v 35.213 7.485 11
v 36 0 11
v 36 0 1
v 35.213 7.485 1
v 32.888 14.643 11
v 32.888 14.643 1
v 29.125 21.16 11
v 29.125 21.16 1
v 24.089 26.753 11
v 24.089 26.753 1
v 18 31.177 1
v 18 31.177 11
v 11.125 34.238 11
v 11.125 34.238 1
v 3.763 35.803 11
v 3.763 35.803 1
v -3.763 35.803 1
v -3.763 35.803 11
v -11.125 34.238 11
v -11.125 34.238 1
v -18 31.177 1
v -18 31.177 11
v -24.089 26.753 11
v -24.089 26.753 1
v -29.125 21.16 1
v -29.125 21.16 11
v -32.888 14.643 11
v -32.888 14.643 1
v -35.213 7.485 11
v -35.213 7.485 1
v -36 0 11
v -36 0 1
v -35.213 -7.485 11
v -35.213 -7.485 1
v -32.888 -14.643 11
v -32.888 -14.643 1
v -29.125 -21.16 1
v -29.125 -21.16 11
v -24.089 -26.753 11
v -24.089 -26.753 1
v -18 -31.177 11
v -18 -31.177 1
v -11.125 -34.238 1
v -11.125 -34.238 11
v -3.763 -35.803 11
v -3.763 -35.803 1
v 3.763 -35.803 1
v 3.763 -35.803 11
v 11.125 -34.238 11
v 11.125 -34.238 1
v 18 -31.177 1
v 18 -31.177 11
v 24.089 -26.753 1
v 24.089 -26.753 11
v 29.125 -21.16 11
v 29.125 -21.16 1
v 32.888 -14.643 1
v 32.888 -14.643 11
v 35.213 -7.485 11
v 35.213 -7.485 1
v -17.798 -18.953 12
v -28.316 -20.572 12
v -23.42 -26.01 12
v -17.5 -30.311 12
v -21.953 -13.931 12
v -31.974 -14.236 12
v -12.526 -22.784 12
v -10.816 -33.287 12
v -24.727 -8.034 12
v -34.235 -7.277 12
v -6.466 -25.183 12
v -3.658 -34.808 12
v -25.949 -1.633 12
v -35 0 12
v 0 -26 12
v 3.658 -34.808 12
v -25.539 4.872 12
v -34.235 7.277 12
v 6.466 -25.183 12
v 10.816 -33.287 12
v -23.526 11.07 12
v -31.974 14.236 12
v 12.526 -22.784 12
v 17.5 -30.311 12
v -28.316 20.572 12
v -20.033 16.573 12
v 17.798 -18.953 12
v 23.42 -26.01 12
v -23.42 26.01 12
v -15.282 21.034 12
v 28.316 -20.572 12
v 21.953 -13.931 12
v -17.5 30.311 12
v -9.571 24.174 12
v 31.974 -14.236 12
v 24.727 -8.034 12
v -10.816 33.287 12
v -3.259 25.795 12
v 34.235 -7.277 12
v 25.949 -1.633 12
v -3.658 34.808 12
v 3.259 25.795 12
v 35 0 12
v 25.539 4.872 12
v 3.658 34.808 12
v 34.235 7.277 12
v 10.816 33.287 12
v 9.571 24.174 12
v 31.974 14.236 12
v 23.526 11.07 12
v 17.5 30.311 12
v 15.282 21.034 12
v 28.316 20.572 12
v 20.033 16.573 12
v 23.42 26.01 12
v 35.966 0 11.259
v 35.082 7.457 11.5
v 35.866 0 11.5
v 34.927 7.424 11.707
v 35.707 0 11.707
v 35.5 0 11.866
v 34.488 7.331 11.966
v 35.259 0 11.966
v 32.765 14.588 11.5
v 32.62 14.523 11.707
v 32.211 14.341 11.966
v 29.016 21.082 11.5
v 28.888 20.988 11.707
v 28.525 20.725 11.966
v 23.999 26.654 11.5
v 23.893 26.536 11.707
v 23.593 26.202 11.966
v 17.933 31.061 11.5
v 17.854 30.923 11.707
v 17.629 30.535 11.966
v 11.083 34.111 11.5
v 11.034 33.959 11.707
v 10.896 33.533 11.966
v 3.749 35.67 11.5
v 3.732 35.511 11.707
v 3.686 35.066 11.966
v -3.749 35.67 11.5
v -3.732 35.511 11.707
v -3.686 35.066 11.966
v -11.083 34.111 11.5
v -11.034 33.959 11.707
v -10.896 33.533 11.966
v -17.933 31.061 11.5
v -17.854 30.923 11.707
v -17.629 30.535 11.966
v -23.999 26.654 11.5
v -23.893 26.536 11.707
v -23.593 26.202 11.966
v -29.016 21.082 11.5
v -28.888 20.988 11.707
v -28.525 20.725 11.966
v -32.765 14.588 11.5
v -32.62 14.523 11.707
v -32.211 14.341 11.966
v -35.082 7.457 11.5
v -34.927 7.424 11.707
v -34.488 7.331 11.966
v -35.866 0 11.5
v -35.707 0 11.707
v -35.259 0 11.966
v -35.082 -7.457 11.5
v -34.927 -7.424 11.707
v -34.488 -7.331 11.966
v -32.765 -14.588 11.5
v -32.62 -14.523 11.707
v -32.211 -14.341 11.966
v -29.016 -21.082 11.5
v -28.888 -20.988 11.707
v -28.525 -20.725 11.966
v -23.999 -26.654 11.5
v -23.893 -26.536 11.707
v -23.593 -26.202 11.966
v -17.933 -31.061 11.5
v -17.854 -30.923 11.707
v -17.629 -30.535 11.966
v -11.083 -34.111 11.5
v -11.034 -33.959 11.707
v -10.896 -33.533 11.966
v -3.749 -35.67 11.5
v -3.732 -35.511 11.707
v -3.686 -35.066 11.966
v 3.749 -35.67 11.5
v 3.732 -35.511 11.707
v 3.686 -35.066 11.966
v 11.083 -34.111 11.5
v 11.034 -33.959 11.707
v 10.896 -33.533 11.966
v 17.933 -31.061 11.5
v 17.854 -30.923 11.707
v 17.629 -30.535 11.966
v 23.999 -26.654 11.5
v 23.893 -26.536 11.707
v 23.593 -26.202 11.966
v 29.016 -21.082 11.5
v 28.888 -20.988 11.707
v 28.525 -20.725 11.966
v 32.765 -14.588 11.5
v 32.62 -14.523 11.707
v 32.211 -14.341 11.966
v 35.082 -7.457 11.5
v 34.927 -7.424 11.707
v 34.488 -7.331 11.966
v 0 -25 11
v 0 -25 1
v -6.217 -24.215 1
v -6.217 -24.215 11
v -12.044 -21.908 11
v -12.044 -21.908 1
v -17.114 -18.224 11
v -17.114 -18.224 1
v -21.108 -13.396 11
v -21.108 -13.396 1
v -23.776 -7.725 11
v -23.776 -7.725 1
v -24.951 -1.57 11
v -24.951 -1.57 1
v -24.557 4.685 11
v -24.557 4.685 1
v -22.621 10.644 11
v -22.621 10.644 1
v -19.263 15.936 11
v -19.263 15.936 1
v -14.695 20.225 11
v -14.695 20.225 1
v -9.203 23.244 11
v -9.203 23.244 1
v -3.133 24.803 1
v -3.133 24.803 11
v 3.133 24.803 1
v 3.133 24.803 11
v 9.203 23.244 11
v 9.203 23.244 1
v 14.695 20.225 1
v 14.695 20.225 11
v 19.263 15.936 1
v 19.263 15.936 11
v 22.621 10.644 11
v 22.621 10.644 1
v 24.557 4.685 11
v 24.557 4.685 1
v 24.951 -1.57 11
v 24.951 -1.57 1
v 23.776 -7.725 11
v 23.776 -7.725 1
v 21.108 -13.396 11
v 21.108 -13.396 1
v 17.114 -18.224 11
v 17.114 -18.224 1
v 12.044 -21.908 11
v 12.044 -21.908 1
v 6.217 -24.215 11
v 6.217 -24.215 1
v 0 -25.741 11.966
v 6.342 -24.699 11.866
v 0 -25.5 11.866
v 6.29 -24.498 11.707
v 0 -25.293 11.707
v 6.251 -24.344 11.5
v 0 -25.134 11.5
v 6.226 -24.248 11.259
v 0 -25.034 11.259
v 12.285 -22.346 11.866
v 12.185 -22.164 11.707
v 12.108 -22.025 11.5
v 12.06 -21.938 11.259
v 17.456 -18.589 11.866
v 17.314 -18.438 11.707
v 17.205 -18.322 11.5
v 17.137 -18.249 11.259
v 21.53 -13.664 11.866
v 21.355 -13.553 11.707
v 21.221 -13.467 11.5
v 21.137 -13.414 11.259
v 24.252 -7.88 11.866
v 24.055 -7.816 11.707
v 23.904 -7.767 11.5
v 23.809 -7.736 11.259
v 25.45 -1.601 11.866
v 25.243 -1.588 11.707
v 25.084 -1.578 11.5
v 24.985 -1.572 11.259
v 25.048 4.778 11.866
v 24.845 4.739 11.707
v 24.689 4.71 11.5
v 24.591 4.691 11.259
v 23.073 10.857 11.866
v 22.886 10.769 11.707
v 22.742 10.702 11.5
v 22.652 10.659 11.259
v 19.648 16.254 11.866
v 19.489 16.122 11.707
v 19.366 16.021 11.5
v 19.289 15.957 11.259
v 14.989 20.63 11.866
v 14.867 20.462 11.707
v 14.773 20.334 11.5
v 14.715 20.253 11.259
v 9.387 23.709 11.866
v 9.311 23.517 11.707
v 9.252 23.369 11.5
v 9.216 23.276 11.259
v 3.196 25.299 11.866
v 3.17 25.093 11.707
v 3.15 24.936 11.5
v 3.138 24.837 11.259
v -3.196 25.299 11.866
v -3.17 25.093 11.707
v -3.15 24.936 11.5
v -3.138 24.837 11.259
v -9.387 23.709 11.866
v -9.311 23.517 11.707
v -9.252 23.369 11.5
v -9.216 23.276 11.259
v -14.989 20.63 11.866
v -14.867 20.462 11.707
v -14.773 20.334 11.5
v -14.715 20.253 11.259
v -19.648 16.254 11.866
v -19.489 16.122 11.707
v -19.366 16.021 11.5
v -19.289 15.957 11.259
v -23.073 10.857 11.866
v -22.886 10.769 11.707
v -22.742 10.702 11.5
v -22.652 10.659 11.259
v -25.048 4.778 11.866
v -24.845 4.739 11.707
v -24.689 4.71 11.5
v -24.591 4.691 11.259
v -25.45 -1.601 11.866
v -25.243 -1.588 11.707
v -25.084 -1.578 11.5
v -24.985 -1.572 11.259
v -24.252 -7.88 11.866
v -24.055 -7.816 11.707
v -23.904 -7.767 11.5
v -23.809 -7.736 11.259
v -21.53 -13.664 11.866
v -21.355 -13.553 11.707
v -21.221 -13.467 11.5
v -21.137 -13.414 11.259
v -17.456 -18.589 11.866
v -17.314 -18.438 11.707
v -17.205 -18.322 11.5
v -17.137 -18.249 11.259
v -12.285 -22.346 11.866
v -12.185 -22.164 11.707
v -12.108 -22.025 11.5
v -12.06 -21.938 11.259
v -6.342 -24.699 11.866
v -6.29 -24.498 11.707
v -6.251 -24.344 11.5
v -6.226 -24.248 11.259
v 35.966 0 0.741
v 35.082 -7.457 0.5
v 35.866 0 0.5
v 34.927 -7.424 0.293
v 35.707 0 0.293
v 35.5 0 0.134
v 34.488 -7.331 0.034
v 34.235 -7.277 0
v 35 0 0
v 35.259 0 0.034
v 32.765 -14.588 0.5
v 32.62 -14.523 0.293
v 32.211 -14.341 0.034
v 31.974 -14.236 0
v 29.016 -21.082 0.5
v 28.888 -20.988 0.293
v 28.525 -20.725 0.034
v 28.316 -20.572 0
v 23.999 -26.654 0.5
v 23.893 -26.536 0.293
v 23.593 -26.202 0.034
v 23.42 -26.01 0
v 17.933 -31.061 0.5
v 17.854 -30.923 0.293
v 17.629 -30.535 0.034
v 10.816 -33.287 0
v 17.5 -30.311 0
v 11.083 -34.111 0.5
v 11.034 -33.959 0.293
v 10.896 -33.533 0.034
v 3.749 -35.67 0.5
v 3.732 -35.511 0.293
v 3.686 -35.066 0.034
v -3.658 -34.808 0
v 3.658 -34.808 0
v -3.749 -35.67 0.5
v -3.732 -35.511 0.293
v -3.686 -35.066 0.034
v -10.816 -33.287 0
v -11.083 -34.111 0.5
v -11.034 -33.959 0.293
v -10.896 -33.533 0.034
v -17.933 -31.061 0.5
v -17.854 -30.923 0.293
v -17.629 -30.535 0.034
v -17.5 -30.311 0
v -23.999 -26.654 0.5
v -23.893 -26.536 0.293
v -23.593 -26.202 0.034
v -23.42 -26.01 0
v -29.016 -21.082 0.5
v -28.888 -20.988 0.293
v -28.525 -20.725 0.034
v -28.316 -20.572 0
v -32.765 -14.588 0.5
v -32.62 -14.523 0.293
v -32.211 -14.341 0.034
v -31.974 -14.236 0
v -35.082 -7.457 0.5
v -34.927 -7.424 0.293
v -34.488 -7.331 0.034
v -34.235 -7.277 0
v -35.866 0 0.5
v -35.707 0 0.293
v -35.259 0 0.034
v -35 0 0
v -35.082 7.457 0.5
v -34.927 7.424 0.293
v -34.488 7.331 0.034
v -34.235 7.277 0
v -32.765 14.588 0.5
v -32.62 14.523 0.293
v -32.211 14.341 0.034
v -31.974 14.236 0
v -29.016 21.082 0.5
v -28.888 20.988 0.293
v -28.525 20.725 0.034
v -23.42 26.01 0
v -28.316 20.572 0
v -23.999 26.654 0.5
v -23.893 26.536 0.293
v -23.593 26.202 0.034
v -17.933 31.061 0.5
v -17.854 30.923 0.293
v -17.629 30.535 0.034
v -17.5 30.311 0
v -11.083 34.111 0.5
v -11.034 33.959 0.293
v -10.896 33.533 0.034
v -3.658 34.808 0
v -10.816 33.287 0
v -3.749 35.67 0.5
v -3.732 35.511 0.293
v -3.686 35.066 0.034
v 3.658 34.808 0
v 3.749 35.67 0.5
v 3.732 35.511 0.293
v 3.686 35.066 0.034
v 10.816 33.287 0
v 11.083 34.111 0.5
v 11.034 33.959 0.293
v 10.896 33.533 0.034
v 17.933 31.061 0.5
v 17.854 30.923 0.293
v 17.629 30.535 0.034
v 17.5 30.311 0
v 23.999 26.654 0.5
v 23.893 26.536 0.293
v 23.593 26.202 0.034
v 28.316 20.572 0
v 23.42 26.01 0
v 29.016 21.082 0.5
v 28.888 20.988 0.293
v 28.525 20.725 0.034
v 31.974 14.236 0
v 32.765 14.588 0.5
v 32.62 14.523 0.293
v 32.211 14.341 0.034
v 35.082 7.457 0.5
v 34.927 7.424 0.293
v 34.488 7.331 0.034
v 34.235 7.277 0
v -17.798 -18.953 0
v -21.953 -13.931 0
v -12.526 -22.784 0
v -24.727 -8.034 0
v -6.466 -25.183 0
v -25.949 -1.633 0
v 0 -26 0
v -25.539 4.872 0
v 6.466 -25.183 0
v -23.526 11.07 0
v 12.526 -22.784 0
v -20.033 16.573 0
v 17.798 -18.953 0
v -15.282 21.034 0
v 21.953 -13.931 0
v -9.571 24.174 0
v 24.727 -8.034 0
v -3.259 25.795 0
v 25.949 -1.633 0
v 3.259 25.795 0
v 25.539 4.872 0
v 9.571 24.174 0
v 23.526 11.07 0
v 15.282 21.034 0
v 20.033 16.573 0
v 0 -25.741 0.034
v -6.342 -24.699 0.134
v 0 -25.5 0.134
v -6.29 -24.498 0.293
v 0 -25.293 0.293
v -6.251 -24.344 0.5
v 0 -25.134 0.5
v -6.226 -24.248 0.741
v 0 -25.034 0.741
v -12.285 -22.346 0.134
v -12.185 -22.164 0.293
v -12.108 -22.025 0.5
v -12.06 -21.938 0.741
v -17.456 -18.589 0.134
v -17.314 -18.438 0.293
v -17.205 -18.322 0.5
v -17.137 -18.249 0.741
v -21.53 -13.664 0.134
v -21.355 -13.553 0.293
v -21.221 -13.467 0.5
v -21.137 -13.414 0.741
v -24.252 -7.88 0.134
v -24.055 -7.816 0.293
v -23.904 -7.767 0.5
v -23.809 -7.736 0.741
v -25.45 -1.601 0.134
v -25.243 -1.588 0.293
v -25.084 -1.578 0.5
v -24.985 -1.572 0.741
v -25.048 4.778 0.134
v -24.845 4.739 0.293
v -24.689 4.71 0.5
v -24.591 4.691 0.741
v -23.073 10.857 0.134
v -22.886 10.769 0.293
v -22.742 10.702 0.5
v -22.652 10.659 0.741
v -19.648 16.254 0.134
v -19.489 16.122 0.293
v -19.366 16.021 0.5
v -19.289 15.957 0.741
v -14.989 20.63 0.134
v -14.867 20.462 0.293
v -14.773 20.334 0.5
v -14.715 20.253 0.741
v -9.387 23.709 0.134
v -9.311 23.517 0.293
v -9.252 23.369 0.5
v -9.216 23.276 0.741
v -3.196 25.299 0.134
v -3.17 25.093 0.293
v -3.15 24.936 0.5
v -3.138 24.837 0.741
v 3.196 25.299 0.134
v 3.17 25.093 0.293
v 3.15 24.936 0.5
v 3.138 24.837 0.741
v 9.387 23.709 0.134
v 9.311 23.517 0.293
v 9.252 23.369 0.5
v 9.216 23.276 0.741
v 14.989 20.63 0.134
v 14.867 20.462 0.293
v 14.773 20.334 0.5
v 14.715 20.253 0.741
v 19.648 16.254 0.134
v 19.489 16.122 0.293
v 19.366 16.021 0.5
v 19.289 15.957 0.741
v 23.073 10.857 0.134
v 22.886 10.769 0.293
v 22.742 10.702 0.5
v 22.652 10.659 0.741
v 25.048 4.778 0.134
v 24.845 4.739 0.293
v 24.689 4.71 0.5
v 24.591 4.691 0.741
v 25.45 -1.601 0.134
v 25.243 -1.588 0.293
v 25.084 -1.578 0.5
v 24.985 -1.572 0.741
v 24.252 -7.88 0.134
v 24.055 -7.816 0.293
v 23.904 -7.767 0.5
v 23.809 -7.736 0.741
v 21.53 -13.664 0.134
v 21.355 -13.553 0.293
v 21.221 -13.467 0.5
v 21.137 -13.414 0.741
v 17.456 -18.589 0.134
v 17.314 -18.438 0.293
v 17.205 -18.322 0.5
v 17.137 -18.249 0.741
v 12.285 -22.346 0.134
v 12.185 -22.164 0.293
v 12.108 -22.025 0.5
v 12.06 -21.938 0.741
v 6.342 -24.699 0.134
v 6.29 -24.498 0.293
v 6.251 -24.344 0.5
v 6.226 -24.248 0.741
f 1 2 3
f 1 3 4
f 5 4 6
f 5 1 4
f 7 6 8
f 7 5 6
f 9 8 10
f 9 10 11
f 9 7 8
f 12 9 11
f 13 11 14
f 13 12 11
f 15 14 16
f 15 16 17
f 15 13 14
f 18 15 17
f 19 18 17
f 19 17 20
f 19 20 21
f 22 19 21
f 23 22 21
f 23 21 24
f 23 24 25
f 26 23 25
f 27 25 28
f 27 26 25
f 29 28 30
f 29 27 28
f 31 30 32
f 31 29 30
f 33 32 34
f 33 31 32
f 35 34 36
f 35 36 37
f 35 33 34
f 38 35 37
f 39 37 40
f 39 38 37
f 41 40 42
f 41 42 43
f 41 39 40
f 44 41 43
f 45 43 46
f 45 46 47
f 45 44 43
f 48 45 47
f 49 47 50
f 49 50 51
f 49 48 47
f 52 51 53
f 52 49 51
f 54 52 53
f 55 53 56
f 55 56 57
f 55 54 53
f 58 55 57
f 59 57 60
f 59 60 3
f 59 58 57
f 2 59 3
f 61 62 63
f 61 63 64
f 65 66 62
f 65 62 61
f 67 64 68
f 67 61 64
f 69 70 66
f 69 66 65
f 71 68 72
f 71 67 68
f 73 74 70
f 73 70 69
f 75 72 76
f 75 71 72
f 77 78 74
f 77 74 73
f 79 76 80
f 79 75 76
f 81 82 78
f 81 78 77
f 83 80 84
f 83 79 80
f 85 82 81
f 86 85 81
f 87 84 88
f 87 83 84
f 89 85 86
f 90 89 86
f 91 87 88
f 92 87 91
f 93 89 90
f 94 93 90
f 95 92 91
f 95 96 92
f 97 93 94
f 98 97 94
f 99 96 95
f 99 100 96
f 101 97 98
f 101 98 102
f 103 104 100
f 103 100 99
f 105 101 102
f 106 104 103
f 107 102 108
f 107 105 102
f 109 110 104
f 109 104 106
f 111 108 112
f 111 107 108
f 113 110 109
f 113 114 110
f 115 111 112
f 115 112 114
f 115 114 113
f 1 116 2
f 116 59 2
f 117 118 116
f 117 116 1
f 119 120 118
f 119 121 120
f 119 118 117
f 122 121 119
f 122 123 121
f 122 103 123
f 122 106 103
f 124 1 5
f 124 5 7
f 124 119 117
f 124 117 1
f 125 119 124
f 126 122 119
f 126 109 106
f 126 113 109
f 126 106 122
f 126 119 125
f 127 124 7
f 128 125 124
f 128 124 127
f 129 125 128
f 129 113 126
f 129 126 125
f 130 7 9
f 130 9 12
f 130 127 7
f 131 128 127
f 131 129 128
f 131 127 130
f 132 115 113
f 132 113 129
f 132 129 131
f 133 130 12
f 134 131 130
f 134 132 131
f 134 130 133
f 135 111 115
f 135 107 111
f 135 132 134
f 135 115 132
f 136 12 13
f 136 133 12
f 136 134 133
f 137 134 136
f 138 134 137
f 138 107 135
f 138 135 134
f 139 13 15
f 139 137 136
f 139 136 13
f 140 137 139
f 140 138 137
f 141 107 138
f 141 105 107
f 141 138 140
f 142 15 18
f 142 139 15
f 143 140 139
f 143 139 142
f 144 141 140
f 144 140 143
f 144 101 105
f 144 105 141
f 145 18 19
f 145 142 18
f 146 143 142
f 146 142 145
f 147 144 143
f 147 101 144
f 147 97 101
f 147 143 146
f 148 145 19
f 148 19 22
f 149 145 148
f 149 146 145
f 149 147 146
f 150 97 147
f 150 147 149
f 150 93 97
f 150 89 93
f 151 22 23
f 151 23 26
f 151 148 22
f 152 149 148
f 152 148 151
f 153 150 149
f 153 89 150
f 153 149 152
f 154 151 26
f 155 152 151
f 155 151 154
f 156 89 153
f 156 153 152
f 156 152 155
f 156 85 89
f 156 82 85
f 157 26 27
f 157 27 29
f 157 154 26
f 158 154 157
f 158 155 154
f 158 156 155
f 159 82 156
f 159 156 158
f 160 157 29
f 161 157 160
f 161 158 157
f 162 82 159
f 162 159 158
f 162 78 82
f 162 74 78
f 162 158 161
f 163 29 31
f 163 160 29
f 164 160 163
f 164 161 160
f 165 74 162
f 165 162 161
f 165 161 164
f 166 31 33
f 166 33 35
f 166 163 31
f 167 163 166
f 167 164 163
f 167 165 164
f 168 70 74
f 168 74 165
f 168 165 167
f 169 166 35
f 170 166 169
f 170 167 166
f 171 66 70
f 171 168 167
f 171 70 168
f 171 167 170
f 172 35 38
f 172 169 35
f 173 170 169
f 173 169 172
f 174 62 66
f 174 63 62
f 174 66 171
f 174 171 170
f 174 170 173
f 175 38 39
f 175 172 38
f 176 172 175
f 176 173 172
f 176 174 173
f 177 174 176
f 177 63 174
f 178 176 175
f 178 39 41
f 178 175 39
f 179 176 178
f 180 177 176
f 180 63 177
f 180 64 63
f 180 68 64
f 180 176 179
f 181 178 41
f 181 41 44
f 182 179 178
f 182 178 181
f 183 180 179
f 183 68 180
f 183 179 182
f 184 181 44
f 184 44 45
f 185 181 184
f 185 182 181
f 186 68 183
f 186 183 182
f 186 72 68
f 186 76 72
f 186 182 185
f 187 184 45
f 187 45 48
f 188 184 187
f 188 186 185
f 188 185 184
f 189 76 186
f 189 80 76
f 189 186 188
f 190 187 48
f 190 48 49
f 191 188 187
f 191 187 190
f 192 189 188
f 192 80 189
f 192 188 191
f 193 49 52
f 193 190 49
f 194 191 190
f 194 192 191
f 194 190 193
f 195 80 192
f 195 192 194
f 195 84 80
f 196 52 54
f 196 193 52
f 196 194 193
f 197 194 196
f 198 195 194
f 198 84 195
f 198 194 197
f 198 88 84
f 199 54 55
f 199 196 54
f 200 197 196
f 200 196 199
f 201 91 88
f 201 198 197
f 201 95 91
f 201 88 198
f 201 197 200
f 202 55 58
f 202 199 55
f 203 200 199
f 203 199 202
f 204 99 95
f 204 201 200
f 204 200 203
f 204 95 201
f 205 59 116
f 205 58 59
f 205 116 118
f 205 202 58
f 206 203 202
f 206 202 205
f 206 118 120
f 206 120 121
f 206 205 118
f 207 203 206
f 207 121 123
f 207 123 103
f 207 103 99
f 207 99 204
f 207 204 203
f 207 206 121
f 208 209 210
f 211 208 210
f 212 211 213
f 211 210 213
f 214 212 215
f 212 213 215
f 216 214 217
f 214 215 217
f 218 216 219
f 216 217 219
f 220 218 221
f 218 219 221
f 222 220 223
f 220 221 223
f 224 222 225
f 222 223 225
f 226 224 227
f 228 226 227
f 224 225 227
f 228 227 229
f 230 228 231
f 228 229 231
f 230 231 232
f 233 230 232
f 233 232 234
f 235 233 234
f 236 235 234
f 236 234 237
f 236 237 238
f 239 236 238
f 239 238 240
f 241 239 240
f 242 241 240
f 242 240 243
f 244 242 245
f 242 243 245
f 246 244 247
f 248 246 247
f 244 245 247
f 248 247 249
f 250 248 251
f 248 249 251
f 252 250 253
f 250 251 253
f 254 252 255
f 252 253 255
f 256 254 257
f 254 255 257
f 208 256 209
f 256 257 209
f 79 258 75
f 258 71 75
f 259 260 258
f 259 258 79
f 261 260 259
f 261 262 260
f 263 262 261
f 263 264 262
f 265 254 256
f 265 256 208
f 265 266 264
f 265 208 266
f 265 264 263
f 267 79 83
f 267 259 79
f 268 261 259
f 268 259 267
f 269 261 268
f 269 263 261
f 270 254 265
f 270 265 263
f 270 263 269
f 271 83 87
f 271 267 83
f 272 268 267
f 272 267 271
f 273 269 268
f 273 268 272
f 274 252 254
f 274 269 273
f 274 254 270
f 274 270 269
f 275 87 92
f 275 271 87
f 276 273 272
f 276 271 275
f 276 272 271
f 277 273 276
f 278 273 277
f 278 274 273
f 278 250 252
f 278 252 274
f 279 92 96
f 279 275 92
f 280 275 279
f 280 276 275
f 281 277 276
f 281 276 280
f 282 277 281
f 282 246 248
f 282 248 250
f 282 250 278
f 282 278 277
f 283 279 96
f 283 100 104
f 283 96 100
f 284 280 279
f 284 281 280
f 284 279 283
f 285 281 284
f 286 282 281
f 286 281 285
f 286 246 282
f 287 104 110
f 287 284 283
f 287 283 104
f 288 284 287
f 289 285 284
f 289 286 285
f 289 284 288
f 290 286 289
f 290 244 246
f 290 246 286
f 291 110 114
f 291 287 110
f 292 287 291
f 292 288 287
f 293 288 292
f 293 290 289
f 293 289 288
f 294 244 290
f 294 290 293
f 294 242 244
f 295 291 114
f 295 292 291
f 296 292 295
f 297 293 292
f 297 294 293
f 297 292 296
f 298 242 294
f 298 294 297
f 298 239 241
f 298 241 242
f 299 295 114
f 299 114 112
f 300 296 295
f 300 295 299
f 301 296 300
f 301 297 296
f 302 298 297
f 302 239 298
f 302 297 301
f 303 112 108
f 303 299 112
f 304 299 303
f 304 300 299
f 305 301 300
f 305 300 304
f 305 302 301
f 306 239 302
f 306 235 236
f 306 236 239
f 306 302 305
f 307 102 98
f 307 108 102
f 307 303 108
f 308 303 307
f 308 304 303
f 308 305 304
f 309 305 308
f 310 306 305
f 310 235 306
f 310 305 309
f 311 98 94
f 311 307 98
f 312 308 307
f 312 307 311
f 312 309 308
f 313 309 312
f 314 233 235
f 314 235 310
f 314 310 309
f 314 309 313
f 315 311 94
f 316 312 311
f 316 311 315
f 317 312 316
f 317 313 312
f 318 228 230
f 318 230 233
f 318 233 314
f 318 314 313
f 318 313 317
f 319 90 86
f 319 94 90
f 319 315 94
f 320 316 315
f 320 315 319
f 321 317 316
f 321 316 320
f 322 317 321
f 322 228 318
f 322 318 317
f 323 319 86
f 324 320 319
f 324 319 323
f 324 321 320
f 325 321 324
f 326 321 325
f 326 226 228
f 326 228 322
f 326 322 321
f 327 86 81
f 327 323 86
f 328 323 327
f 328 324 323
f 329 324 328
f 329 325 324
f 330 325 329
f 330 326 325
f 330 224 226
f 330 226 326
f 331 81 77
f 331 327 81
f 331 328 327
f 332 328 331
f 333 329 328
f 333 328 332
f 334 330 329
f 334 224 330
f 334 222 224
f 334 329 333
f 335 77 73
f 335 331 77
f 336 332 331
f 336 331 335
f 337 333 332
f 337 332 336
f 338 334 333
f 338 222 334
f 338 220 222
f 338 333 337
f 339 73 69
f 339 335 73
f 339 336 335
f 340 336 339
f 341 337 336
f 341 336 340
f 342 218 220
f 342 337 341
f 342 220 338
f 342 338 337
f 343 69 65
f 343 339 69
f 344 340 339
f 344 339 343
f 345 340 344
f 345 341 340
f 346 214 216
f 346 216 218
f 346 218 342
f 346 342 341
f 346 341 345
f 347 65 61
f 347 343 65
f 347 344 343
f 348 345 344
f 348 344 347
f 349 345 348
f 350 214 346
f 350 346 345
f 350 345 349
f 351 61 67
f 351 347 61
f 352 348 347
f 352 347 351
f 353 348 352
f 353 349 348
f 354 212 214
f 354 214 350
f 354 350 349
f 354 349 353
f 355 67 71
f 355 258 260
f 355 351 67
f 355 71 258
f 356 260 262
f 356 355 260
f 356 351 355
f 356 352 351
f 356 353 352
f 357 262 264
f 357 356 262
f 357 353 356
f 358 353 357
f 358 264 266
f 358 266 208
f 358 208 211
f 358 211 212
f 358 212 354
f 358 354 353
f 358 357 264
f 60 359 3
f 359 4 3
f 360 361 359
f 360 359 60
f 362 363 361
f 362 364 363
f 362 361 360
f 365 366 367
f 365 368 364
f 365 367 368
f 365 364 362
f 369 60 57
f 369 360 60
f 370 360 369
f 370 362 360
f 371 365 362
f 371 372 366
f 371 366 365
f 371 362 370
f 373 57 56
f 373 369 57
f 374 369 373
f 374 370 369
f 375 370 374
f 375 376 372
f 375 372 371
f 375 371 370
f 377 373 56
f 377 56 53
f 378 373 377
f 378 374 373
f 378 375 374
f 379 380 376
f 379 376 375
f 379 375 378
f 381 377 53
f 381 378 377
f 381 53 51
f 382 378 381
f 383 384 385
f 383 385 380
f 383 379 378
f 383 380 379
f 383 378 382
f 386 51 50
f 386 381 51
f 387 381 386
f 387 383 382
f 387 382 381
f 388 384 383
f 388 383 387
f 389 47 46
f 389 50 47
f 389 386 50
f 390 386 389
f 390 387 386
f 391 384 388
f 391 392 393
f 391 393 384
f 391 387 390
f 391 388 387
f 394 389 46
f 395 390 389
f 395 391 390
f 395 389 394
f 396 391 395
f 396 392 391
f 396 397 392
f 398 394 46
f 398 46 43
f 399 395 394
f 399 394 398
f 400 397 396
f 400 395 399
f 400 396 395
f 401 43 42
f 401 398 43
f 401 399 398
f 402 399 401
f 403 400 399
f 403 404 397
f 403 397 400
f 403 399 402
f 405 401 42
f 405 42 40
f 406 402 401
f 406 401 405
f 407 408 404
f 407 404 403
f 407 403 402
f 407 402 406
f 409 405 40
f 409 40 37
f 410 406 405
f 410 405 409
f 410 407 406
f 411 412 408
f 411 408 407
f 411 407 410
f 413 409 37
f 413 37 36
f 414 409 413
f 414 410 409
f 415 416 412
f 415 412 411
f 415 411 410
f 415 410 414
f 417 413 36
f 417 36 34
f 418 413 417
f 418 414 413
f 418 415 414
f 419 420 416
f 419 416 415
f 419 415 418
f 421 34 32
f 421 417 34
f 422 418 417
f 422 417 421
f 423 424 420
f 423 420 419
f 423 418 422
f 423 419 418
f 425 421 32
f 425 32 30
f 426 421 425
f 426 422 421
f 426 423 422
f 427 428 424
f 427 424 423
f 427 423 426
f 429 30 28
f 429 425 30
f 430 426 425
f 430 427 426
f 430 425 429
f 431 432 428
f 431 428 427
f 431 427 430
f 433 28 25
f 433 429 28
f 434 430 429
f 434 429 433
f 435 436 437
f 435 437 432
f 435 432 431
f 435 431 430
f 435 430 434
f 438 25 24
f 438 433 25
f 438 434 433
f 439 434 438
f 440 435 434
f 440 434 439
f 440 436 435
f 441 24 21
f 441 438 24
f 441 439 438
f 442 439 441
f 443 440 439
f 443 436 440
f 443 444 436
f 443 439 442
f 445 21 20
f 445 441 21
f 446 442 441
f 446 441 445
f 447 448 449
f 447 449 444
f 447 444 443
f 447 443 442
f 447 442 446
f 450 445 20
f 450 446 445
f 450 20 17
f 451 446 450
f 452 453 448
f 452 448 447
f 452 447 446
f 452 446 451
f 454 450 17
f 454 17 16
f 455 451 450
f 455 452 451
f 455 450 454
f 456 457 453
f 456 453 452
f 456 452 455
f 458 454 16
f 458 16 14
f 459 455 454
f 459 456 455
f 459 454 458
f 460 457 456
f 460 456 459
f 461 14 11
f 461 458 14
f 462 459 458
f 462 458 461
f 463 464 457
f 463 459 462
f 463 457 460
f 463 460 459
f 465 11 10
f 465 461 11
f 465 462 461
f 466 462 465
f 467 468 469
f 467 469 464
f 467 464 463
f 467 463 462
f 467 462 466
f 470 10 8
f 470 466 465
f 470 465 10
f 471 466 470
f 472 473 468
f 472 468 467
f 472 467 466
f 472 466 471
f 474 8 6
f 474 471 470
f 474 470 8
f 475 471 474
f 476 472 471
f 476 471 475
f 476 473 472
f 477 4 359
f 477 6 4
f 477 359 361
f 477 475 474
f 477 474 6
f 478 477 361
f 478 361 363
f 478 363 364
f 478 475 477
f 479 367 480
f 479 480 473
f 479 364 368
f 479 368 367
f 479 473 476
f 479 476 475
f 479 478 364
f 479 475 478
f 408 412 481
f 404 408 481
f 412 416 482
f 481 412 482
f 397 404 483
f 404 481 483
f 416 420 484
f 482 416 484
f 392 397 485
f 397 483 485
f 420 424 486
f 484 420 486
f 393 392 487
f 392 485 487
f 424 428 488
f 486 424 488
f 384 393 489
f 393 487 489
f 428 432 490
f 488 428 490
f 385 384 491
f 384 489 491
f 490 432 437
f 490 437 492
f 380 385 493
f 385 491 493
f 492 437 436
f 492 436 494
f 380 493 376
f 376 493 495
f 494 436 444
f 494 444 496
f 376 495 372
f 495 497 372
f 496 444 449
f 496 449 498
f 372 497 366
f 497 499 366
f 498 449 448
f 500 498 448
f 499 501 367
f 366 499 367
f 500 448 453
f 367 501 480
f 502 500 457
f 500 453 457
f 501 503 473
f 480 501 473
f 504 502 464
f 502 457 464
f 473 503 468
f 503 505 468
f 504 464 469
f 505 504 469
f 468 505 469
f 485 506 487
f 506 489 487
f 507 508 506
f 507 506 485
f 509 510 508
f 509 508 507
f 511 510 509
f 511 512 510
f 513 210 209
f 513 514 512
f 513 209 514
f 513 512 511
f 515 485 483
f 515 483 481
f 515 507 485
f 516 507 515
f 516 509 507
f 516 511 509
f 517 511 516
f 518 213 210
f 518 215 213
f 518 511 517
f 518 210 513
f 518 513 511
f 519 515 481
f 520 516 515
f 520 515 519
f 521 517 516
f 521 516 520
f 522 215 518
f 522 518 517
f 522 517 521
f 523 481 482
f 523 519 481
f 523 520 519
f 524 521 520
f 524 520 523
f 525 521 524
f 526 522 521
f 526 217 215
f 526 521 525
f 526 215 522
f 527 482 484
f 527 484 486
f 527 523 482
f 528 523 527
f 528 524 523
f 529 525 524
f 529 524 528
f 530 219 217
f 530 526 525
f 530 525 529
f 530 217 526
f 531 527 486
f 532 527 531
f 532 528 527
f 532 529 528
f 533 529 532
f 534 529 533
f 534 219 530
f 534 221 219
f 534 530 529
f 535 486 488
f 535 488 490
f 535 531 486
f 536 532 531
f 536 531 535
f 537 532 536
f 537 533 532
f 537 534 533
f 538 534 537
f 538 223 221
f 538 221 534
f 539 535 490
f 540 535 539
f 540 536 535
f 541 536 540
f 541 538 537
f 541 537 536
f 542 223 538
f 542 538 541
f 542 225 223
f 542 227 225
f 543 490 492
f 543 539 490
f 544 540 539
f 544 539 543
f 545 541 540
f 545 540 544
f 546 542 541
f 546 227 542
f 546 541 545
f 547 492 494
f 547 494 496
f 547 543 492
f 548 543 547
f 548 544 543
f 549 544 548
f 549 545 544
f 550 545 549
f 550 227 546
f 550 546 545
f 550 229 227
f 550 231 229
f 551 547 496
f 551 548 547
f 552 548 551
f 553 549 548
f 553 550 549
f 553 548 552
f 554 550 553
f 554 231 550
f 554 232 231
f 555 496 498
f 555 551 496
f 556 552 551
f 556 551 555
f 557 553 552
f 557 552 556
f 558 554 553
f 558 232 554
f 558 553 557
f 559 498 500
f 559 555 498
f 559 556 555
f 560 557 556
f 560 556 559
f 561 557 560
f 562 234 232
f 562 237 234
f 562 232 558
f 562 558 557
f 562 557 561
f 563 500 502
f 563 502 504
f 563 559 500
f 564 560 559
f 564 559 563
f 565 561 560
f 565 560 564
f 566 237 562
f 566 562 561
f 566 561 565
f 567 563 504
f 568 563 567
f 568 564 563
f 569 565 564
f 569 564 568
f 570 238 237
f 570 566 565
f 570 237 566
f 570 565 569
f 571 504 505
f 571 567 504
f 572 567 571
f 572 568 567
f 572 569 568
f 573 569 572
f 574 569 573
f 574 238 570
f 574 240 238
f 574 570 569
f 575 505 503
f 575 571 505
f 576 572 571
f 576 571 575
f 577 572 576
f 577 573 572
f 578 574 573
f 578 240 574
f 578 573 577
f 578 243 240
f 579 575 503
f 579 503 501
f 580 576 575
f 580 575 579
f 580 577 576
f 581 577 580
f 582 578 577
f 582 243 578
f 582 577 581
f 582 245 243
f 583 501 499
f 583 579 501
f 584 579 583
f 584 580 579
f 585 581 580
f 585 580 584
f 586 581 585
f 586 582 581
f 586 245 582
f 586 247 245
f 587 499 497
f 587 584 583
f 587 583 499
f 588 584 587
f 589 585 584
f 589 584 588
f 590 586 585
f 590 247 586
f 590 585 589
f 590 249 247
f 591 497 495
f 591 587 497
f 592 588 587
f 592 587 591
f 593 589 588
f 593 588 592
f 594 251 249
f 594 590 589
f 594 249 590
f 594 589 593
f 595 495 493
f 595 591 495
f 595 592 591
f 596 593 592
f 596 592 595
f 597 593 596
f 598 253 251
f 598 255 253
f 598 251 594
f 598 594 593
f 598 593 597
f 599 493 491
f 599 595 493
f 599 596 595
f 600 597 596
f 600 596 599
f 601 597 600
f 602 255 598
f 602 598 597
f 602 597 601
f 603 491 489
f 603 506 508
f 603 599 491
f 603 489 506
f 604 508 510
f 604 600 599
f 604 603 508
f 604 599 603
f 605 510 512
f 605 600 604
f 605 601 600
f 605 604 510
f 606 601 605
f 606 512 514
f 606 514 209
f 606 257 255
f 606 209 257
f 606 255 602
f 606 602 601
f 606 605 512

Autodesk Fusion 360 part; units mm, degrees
cylinder "CylinderPrimitive1" add diameter 72 height 12 placed x (1, 0, 0) y (0, 1, 0) z (0, 0, 1) at (0, 0, 0)
hole "Hole1" at (0, 0, 12) direction (0, 0, -1) diameter 50 depth 12 tip angle 180
fillet "Fillet1" radius 1 4 edges at (-33.5638, -13.0182, 12) (-23.3082, 9.0404, 12) (-33.5638, 13.0182, 0) (-23.3082, -9.0404, 0)
